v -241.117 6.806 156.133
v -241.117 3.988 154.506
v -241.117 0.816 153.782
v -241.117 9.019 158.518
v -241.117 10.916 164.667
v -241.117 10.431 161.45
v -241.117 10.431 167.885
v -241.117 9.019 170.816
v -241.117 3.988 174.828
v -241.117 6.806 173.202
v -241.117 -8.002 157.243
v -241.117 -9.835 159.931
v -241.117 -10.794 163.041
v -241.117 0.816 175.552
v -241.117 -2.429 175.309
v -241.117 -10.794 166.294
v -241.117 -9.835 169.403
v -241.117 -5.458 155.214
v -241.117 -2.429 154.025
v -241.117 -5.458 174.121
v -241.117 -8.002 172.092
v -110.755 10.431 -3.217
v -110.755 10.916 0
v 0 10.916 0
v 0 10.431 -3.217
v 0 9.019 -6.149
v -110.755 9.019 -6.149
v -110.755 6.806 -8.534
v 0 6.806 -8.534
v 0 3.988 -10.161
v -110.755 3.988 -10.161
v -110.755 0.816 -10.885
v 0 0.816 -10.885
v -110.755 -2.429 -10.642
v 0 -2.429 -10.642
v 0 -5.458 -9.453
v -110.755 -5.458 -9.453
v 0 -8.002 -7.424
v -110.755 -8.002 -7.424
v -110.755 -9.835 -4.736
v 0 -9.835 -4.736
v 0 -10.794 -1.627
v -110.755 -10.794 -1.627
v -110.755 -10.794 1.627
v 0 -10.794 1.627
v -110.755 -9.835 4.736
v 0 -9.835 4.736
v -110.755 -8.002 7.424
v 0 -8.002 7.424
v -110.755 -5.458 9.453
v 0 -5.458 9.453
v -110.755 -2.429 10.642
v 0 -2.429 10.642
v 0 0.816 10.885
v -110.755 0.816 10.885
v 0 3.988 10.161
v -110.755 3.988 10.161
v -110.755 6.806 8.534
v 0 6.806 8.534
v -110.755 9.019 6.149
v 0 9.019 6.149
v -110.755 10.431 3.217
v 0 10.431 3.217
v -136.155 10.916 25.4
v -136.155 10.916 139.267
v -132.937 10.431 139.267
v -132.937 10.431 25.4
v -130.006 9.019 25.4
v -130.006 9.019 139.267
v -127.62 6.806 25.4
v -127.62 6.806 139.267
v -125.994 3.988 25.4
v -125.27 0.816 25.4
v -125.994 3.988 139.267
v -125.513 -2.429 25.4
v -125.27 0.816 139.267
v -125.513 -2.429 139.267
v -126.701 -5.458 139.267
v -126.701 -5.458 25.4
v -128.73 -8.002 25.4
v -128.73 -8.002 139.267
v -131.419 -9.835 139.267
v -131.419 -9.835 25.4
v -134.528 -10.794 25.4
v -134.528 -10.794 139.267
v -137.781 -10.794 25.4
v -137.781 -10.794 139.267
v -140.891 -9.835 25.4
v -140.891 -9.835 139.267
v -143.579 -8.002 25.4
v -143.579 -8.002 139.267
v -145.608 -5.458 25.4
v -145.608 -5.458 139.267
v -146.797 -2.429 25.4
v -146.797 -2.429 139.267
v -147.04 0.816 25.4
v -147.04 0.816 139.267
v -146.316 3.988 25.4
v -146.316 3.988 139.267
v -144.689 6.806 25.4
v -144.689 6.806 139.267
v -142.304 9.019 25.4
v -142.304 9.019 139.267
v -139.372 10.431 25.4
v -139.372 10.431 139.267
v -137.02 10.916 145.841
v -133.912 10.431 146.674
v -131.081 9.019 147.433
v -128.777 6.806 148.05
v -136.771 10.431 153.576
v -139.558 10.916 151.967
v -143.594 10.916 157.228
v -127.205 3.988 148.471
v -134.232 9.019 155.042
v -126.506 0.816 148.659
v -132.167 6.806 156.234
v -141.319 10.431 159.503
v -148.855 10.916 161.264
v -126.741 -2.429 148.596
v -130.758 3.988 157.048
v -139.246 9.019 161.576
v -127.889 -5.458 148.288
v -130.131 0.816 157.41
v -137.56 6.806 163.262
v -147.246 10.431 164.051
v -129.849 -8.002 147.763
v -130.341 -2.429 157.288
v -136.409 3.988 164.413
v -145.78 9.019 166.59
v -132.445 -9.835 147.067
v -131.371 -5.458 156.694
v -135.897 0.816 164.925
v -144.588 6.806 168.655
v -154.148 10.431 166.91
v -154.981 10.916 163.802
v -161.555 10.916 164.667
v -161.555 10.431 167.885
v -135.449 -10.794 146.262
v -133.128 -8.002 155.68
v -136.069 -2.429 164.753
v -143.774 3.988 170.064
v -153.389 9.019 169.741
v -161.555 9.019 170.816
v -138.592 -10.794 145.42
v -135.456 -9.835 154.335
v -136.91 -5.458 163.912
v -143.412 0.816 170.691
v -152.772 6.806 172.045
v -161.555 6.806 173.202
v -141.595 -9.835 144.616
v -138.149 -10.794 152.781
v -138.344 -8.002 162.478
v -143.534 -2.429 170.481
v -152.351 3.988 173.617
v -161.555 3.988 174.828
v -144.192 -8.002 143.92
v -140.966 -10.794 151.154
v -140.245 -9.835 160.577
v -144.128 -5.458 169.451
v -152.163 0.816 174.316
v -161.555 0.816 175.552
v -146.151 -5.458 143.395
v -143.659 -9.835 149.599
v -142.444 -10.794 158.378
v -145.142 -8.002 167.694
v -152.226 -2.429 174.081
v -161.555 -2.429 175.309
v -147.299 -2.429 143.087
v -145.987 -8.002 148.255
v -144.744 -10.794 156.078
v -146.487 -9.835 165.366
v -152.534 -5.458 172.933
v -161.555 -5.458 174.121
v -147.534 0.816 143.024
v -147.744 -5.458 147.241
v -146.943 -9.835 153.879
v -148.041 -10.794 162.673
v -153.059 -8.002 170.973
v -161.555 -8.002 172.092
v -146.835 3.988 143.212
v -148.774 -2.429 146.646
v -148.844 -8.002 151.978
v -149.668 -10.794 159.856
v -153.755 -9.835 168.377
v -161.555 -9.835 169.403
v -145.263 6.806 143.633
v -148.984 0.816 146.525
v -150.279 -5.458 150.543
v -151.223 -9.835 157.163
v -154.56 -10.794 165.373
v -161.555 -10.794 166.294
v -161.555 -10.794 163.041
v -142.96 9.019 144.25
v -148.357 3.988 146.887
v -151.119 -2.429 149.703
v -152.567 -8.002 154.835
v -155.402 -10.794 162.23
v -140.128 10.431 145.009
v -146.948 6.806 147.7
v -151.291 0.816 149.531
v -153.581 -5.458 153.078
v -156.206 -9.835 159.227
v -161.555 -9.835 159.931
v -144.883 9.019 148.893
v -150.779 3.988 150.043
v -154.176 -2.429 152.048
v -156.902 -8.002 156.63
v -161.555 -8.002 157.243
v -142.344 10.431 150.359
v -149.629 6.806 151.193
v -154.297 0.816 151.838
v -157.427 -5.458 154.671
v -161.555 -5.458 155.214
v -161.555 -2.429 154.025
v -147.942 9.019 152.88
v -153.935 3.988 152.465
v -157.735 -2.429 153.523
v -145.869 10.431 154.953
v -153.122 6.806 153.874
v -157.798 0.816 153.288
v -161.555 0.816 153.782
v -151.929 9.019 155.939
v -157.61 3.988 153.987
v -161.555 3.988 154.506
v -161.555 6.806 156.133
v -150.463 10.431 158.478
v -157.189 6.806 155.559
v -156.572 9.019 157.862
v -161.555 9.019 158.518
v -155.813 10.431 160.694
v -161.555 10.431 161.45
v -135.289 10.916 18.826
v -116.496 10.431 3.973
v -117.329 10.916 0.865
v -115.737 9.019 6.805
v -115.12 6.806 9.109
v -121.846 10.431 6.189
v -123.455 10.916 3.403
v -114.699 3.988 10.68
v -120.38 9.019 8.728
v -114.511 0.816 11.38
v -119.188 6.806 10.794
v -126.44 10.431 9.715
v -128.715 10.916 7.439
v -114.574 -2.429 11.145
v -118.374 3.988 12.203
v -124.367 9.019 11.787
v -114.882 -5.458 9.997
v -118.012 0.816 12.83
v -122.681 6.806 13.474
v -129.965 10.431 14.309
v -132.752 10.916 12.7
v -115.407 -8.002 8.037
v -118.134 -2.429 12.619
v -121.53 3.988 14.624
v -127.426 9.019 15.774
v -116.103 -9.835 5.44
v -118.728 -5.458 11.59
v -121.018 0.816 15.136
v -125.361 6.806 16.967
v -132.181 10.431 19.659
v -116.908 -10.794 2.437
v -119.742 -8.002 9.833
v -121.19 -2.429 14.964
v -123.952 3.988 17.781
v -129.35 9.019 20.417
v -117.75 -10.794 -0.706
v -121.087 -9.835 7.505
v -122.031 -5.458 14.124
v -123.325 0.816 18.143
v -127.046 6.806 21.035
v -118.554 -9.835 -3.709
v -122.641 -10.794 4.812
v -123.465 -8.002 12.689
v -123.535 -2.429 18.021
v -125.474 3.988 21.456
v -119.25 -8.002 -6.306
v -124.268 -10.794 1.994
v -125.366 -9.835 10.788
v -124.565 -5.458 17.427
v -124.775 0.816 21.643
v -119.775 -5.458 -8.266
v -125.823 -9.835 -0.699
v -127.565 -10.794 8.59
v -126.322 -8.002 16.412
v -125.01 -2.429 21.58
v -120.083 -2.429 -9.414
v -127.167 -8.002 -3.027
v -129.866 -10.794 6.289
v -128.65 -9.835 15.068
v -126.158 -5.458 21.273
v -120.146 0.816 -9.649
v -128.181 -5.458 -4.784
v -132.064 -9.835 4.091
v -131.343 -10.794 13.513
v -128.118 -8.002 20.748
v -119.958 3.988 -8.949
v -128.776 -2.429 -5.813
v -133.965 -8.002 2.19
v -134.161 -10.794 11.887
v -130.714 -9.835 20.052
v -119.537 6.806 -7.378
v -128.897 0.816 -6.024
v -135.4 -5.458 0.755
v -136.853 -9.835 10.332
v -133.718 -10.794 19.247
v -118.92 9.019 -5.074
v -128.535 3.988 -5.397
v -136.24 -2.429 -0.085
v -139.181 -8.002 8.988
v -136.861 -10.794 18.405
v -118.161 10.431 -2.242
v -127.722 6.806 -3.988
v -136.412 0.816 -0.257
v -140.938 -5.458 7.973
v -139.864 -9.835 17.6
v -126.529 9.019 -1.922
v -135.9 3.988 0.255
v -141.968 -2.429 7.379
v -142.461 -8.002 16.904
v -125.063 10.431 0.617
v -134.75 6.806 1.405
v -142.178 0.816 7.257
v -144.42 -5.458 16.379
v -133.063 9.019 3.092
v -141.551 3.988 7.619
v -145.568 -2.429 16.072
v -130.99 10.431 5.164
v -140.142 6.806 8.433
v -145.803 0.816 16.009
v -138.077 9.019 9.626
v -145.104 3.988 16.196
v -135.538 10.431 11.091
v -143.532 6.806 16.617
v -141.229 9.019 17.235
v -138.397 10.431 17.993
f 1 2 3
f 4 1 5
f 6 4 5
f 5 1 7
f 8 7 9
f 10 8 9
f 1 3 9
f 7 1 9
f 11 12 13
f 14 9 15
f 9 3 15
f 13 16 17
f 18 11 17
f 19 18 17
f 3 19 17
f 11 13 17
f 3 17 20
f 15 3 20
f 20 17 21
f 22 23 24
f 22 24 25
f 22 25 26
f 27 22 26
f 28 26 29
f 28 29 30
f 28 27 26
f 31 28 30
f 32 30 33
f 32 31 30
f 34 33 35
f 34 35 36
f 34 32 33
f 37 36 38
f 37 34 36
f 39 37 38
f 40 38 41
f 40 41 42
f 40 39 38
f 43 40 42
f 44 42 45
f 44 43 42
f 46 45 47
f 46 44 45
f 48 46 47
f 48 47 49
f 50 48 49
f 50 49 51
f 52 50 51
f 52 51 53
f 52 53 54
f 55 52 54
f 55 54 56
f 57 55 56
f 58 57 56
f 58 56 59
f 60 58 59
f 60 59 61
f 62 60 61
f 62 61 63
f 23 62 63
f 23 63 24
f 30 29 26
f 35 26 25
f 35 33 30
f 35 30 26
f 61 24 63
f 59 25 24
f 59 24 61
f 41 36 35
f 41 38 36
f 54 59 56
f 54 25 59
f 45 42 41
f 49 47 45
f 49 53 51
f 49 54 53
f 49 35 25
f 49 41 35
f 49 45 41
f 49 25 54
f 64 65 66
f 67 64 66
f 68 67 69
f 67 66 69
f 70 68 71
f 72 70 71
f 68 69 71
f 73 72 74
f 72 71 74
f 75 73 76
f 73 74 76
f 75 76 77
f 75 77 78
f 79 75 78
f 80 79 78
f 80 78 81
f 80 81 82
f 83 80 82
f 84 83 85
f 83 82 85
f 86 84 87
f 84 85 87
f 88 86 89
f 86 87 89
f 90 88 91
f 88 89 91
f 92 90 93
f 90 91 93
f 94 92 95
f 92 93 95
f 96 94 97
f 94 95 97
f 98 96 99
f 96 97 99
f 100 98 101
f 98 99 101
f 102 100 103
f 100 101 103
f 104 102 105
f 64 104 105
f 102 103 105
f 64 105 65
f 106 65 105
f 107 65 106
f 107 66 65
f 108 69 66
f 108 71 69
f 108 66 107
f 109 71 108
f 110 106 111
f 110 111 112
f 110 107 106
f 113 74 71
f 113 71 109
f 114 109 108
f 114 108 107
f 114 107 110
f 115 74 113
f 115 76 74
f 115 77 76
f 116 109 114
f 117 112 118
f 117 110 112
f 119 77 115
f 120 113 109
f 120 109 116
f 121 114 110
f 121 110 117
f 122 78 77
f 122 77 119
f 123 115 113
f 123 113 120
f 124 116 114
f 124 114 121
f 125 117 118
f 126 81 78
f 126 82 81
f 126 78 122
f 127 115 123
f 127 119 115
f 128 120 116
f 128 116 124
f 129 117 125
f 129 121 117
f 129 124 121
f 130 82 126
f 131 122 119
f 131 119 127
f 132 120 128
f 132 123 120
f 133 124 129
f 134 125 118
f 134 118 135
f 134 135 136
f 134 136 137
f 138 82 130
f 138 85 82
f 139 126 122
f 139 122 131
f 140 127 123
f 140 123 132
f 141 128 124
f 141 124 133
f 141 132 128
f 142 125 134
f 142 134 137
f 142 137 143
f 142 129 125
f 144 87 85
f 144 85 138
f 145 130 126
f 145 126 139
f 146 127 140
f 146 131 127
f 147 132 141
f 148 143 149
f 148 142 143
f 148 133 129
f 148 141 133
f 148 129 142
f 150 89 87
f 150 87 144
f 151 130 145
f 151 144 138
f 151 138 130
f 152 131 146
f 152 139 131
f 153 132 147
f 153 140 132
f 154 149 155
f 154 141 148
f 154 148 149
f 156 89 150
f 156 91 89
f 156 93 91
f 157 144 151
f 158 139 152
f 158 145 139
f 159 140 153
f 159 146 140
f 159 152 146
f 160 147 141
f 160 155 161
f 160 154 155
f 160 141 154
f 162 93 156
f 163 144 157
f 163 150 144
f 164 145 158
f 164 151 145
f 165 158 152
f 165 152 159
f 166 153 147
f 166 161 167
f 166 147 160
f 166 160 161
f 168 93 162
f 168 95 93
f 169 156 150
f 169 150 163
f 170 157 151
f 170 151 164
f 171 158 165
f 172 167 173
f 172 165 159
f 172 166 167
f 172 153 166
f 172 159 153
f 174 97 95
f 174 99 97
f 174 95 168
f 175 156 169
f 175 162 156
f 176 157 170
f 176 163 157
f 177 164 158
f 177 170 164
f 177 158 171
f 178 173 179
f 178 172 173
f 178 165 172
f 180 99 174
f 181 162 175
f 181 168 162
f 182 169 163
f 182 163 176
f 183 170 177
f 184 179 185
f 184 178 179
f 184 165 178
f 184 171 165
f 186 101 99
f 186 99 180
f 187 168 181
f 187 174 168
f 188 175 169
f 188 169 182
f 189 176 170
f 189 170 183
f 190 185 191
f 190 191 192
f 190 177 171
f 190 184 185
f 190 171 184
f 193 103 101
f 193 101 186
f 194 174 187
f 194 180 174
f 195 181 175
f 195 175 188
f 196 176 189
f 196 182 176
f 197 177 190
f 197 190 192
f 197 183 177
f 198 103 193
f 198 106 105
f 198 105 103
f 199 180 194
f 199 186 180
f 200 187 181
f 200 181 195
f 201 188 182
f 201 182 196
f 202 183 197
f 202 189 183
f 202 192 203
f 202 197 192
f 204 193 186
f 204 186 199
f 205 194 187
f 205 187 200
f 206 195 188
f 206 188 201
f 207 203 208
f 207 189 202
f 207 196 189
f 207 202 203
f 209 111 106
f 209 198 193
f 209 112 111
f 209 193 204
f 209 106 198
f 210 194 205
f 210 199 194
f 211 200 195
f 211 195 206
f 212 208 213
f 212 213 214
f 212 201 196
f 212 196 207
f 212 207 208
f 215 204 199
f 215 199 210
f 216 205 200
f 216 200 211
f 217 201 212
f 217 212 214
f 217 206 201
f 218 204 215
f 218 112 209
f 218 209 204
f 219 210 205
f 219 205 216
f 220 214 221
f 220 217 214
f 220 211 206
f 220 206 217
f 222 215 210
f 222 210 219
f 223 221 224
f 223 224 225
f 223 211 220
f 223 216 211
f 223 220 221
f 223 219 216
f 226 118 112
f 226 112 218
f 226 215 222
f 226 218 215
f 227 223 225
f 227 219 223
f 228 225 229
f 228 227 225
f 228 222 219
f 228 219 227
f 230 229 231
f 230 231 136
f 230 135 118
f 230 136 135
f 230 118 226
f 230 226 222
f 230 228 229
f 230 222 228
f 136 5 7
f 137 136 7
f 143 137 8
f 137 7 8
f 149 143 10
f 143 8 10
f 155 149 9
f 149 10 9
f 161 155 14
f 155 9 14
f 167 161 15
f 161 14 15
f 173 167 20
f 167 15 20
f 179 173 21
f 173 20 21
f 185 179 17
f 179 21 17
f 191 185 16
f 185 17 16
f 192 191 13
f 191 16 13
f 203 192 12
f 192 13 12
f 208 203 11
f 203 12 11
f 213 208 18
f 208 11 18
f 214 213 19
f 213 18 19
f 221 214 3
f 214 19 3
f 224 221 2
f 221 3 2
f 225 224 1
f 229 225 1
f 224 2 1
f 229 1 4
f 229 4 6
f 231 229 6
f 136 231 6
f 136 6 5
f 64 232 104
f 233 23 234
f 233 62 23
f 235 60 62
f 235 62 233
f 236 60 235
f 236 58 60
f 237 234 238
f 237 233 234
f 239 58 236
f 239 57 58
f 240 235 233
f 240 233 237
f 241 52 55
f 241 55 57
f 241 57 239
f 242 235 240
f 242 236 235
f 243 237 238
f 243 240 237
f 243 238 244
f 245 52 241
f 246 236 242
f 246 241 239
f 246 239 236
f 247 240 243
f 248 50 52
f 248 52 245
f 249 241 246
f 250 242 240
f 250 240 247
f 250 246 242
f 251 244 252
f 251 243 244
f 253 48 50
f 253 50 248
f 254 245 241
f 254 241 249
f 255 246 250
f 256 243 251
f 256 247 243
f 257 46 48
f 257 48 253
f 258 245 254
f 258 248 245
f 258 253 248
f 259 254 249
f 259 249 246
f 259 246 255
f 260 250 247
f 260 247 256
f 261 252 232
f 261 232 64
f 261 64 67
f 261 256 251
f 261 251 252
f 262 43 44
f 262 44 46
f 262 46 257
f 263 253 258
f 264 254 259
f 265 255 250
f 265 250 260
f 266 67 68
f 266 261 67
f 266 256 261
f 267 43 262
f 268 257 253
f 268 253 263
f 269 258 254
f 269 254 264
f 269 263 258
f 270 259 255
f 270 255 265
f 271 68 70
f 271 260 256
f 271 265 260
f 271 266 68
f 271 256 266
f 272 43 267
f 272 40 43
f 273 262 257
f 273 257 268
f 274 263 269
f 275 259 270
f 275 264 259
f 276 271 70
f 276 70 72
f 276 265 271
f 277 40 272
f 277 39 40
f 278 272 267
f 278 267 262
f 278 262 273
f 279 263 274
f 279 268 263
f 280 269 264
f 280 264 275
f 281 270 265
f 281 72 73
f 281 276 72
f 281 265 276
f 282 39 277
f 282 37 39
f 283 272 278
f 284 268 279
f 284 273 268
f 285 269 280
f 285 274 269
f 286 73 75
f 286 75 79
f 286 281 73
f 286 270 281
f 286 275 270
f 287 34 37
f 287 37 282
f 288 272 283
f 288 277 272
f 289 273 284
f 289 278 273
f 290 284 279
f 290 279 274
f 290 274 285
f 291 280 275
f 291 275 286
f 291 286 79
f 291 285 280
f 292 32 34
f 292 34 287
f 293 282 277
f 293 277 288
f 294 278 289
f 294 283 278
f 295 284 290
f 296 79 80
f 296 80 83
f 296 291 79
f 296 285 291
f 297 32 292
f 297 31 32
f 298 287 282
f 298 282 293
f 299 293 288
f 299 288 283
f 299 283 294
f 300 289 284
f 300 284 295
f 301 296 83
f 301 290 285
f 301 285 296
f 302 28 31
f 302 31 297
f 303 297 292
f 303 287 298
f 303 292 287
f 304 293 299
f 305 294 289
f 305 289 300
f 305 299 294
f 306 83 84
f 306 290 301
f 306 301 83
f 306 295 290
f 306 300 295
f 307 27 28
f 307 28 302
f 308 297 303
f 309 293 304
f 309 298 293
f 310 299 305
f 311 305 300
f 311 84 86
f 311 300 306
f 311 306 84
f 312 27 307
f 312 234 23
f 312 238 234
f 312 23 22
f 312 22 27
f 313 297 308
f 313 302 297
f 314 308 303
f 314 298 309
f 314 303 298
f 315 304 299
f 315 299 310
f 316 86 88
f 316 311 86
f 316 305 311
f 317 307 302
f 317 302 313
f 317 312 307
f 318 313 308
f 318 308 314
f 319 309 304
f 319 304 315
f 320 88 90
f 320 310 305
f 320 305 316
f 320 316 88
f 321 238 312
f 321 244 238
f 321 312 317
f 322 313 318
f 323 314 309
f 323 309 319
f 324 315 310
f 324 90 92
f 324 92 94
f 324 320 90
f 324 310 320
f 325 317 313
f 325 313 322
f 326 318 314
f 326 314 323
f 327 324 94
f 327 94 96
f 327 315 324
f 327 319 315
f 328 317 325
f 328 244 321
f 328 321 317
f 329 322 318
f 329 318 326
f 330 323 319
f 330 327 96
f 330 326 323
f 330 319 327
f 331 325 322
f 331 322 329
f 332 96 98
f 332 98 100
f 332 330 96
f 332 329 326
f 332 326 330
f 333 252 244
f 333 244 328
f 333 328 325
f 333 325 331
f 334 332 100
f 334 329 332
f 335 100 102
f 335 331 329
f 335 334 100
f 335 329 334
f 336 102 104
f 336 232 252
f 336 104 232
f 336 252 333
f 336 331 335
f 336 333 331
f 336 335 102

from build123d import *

# Parameters (mm, degrees)
F0_R = 10.915594


with BuildPart() as f2:
    # F2: sweep along a path in F1
    with BuildLine(Plane.XZ) as f2_path:
        Line((0, 0), (-110.754612, 0))
        ThreePointArc((-110.754612, 0), (-128.715125, 7.439488), (-136.154612, 25.4))
        Line((-136.154612, 25.4), (-136.154612, 139.267394))
        ThreePointArc((-136.154612, 139.267394), (-143.5941, 157.227906), (-161.554612, 164.667394))
        Line((-161.554612, 164.667394), (-241.116758, 164.667394))
    # F0 (on Right) → F2 (sweep)
    with BuildSketch(Plane.YZ):
        Circle(F0_R)
    sweep(path=f2_path.line)


solid = f2.part
